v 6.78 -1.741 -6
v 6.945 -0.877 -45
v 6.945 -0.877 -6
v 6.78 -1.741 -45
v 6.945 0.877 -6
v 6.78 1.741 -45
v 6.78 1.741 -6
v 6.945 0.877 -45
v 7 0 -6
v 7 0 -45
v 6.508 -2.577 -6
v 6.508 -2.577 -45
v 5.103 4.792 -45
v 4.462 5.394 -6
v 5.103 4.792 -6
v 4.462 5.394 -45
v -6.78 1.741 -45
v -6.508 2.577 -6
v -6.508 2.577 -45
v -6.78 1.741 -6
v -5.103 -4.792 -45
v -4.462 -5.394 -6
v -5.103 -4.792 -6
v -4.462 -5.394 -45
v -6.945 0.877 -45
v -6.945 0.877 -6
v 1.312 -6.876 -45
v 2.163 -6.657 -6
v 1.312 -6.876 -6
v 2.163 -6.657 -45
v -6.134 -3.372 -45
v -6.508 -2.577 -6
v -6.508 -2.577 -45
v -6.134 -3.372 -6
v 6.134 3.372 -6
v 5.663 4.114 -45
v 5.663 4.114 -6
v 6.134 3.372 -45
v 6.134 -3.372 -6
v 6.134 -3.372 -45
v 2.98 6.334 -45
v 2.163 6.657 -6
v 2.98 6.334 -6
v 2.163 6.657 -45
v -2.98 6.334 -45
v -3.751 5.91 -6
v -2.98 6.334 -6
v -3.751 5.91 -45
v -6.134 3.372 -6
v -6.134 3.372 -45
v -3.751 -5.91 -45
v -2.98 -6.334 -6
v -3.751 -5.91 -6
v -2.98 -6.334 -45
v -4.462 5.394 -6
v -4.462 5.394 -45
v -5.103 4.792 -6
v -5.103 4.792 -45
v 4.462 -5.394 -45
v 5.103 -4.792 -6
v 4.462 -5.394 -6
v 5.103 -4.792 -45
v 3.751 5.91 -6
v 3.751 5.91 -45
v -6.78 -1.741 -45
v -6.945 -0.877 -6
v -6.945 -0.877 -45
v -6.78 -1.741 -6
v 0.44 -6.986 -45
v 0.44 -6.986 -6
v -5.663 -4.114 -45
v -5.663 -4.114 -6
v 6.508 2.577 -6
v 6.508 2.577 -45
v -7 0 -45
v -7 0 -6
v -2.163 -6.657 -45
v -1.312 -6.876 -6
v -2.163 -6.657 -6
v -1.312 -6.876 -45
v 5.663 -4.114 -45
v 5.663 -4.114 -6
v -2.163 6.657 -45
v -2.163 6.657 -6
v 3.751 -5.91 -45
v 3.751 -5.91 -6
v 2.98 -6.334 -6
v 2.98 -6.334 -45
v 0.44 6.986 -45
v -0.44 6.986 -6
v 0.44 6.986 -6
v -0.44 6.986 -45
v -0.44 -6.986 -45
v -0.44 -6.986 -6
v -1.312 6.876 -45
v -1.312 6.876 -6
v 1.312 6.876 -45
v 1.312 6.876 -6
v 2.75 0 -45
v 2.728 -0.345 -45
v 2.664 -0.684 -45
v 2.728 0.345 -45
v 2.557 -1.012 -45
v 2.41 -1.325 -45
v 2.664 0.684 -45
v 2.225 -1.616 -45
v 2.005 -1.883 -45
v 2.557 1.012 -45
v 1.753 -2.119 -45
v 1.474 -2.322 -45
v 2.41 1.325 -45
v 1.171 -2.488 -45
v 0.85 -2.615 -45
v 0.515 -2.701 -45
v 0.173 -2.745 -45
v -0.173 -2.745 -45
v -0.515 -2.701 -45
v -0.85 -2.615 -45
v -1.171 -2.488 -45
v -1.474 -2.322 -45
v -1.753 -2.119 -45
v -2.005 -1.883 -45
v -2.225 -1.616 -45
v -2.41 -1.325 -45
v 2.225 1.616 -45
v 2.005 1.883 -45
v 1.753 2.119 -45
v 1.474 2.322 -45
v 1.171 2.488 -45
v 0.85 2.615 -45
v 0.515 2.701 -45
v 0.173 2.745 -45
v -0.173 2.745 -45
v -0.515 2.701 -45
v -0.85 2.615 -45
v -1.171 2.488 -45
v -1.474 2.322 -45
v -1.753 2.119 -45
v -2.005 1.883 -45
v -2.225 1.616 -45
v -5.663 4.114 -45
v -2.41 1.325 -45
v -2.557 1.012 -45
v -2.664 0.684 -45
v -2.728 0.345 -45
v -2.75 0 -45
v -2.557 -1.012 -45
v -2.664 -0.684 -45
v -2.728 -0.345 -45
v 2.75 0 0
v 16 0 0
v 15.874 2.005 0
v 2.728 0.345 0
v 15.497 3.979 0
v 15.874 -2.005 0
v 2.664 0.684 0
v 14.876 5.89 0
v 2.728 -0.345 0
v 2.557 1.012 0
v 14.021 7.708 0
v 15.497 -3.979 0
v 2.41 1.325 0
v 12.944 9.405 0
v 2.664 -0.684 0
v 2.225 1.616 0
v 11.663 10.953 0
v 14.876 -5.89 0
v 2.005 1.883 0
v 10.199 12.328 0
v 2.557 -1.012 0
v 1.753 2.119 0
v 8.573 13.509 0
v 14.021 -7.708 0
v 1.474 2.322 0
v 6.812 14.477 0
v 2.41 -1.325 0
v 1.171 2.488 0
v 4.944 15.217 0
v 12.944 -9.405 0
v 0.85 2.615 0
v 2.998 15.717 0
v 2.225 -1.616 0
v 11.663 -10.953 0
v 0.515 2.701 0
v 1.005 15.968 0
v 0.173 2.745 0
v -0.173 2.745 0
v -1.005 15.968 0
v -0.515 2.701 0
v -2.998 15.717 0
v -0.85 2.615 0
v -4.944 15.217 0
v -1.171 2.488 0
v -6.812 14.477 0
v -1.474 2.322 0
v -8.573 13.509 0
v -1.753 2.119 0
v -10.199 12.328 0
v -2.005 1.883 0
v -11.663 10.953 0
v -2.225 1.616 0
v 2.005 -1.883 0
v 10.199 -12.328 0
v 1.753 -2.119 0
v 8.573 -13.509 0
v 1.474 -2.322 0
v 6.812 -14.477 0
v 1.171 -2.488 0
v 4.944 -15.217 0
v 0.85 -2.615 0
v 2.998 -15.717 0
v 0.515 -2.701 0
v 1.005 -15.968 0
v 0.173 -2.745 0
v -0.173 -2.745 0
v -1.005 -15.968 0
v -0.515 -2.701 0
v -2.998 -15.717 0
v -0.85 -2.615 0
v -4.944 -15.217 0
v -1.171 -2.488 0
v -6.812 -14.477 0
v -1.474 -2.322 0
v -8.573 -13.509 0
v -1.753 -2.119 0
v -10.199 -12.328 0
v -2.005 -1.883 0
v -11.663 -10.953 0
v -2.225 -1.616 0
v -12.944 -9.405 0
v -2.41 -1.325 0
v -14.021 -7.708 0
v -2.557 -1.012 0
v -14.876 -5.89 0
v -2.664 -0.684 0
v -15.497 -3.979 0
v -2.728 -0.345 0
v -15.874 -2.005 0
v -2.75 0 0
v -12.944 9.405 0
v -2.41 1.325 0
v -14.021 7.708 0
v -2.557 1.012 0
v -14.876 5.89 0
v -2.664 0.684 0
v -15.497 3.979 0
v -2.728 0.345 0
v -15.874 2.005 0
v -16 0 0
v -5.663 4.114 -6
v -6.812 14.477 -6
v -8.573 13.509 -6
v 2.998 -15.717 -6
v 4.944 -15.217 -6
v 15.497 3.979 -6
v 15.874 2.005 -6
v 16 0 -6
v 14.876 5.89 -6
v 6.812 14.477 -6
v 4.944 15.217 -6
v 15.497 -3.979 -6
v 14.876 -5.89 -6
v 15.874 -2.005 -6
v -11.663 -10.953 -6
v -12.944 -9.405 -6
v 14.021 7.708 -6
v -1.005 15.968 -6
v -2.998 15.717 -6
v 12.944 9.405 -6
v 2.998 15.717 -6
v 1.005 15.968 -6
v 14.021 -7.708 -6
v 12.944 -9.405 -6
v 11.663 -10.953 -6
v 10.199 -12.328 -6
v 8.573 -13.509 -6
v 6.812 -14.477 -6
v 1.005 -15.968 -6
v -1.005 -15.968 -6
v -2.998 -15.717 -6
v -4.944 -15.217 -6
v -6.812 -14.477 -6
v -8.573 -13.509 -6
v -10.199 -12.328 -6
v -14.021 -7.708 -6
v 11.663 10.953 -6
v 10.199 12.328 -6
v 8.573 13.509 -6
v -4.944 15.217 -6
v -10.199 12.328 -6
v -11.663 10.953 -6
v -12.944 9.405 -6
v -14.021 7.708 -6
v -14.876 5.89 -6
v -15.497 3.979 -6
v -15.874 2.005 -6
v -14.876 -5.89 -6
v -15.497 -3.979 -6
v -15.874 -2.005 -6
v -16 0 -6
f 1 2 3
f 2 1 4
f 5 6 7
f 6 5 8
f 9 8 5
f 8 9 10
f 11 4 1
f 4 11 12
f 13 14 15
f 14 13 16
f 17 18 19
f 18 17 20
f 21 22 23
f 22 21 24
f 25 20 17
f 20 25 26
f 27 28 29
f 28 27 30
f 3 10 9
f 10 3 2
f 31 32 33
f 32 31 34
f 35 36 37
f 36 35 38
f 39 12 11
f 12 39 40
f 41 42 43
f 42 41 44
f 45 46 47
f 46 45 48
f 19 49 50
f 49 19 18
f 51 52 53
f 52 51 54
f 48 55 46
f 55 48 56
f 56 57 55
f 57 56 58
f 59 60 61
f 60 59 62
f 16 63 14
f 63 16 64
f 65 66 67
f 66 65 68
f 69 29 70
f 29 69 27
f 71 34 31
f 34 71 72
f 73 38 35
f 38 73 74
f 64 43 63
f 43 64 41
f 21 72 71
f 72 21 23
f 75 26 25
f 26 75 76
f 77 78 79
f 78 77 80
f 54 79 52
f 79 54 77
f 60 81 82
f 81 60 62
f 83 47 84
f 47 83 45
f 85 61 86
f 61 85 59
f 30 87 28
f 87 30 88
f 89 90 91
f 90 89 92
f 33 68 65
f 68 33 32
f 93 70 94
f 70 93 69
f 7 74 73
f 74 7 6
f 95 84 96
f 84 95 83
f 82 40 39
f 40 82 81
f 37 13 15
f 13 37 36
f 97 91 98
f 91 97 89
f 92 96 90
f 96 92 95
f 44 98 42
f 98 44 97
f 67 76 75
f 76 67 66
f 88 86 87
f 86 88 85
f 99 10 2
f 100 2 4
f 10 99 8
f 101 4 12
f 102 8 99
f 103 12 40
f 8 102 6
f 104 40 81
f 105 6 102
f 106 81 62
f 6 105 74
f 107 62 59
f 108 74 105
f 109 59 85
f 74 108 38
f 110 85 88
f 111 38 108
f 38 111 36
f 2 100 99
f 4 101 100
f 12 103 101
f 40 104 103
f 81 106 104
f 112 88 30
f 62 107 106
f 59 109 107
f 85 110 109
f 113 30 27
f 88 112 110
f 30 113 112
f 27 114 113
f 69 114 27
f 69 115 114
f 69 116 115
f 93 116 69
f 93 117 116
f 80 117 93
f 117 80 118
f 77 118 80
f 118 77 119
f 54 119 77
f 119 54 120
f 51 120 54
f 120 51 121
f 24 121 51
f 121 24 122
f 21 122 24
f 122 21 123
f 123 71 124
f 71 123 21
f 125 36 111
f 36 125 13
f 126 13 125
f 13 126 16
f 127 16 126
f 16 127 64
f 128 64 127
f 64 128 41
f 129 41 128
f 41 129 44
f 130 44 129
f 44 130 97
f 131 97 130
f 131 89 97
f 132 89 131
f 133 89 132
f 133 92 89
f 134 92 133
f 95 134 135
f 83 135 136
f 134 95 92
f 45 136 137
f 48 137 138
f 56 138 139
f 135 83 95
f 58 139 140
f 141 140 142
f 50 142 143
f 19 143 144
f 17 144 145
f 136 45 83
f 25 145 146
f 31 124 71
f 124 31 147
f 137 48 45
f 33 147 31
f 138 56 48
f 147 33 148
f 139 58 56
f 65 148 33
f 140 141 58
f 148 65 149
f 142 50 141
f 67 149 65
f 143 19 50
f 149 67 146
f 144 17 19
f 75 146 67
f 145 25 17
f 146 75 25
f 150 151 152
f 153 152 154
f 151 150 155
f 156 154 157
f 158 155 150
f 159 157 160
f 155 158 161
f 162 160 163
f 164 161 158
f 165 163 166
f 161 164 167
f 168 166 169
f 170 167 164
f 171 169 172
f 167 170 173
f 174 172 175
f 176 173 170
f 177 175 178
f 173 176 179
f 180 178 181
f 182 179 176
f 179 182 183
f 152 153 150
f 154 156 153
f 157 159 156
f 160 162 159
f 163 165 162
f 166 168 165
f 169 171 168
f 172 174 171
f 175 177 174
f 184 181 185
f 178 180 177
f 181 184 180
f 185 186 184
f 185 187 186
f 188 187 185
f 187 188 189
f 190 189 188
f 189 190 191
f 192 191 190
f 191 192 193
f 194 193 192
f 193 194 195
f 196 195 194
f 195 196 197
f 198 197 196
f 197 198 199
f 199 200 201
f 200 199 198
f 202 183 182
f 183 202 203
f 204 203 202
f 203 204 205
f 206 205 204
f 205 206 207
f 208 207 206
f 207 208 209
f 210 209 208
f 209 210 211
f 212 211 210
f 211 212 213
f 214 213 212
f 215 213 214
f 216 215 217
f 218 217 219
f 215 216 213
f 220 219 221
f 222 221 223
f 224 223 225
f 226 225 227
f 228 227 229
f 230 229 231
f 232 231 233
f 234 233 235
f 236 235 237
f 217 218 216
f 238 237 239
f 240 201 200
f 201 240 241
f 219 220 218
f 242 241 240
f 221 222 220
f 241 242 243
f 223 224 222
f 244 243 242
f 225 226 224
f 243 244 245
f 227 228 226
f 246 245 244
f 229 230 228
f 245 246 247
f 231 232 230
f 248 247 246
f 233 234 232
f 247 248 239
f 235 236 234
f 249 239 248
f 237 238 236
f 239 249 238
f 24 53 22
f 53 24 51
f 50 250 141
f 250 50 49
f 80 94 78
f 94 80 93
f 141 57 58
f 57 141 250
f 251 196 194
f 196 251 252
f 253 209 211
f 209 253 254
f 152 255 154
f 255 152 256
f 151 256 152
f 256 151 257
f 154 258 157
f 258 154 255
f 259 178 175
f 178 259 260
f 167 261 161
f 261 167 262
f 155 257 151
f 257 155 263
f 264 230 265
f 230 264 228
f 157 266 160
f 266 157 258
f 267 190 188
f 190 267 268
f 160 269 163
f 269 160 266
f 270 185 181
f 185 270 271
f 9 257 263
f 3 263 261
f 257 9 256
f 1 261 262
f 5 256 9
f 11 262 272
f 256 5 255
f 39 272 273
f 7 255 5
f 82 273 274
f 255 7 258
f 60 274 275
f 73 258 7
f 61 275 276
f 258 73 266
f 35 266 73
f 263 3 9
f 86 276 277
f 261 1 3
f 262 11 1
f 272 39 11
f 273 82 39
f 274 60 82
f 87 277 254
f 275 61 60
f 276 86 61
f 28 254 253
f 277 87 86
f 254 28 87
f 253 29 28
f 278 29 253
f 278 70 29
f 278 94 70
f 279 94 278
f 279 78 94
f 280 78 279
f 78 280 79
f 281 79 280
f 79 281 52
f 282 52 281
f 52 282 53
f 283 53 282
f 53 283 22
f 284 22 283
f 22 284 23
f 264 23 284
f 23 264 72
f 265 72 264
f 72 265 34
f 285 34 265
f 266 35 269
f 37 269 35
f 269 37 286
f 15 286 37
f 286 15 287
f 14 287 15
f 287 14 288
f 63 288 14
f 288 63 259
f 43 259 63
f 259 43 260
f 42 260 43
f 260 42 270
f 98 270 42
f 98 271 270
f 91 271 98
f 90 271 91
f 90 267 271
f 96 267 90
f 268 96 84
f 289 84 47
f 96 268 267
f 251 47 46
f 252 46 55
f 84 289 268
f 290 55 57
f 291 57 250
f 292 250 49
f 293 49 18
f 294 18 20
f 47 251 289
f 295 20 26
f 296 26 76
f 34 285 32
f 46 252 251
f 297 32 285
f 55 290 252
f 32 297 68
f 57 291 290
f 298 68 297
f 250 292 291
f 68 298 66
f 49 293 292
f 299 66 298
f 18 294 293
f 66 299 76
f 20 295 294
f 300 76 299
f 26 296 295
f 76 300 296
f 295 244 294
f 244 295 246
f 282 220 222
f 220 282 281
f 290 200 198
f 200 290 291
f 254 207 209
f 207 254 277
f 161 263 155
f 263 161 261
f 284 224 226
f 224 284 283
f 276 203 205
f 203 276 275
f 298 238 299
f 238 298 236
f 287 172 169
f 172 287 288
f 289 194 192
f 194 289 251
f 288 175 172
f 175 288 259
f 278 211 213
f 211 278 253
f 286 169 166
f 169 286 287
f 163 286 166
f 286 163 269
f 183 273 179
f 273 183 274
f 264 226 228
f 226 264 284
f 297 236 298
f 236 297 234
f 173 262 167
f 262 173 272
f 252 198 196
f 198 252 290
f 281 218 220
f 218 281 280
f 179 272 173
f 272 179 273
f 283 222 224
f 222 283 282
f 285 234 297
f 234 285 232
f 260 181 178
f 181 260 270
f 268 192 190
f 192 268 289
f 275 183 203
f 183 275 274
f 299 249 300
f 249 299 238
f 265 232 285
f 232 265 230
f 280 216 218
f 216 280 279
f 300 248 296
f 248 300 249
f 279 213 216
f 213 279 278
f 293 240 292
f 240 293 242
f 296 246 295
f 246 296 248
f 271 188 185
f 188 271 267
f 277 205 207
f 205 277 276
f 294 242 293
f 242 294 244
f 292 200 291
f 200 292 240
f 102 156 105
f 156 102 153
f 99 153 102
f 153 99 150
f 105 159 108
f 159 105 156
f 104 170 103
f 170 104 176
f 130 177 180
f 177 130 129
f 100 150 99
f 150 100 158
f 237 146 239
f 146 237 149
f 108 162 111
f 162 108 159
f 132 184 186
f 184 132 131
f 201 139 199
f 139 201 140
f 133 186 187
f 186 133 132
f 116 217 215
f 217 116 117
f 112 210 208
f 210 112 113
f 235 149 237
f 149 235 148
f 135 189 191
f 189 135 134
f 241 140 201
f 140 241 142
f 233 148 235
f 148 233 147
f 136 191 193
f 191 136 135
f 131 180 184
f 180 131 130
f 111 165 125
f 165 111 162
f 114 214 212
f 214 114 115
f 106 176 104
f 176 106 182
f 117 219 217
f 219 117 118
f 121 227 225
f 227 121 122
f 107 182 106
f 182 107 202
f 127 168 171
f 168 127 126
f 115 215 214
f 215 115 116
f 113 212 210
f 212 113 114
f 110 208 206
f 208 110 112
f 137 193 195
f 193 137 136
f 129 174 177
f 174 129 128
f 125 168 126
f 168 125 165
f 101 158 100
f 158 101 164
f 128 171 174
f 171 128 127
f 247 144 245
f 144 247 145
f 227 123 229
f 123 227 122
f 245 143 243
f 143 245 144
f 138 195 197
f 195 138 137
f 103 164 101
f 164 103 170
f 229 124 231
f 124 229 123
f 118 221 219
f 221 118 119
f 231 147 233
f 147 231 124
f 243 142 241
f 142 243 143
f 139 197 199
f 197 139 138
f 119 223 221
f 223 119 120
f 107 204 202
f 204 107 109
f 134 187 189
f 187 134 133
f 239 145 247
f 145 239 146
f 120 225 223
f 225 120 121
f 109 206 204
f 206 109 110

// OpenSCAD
$fn = 50;


difference() {
	union() {
		translate(v = [0, 0, -45.0000000000]) {
			cylinder(h = 45, r = 7.0000000000);
		}
		translate(v = [0, 0, -6.0000000000]) {
			cylinder(h = 6, r = 16.0000000000);
		}
	}
	union() {
		#translate(v = [0, 0, -45]) {
			cylinder(h = 45, r = 2.7500000000);
		}
	}
}
